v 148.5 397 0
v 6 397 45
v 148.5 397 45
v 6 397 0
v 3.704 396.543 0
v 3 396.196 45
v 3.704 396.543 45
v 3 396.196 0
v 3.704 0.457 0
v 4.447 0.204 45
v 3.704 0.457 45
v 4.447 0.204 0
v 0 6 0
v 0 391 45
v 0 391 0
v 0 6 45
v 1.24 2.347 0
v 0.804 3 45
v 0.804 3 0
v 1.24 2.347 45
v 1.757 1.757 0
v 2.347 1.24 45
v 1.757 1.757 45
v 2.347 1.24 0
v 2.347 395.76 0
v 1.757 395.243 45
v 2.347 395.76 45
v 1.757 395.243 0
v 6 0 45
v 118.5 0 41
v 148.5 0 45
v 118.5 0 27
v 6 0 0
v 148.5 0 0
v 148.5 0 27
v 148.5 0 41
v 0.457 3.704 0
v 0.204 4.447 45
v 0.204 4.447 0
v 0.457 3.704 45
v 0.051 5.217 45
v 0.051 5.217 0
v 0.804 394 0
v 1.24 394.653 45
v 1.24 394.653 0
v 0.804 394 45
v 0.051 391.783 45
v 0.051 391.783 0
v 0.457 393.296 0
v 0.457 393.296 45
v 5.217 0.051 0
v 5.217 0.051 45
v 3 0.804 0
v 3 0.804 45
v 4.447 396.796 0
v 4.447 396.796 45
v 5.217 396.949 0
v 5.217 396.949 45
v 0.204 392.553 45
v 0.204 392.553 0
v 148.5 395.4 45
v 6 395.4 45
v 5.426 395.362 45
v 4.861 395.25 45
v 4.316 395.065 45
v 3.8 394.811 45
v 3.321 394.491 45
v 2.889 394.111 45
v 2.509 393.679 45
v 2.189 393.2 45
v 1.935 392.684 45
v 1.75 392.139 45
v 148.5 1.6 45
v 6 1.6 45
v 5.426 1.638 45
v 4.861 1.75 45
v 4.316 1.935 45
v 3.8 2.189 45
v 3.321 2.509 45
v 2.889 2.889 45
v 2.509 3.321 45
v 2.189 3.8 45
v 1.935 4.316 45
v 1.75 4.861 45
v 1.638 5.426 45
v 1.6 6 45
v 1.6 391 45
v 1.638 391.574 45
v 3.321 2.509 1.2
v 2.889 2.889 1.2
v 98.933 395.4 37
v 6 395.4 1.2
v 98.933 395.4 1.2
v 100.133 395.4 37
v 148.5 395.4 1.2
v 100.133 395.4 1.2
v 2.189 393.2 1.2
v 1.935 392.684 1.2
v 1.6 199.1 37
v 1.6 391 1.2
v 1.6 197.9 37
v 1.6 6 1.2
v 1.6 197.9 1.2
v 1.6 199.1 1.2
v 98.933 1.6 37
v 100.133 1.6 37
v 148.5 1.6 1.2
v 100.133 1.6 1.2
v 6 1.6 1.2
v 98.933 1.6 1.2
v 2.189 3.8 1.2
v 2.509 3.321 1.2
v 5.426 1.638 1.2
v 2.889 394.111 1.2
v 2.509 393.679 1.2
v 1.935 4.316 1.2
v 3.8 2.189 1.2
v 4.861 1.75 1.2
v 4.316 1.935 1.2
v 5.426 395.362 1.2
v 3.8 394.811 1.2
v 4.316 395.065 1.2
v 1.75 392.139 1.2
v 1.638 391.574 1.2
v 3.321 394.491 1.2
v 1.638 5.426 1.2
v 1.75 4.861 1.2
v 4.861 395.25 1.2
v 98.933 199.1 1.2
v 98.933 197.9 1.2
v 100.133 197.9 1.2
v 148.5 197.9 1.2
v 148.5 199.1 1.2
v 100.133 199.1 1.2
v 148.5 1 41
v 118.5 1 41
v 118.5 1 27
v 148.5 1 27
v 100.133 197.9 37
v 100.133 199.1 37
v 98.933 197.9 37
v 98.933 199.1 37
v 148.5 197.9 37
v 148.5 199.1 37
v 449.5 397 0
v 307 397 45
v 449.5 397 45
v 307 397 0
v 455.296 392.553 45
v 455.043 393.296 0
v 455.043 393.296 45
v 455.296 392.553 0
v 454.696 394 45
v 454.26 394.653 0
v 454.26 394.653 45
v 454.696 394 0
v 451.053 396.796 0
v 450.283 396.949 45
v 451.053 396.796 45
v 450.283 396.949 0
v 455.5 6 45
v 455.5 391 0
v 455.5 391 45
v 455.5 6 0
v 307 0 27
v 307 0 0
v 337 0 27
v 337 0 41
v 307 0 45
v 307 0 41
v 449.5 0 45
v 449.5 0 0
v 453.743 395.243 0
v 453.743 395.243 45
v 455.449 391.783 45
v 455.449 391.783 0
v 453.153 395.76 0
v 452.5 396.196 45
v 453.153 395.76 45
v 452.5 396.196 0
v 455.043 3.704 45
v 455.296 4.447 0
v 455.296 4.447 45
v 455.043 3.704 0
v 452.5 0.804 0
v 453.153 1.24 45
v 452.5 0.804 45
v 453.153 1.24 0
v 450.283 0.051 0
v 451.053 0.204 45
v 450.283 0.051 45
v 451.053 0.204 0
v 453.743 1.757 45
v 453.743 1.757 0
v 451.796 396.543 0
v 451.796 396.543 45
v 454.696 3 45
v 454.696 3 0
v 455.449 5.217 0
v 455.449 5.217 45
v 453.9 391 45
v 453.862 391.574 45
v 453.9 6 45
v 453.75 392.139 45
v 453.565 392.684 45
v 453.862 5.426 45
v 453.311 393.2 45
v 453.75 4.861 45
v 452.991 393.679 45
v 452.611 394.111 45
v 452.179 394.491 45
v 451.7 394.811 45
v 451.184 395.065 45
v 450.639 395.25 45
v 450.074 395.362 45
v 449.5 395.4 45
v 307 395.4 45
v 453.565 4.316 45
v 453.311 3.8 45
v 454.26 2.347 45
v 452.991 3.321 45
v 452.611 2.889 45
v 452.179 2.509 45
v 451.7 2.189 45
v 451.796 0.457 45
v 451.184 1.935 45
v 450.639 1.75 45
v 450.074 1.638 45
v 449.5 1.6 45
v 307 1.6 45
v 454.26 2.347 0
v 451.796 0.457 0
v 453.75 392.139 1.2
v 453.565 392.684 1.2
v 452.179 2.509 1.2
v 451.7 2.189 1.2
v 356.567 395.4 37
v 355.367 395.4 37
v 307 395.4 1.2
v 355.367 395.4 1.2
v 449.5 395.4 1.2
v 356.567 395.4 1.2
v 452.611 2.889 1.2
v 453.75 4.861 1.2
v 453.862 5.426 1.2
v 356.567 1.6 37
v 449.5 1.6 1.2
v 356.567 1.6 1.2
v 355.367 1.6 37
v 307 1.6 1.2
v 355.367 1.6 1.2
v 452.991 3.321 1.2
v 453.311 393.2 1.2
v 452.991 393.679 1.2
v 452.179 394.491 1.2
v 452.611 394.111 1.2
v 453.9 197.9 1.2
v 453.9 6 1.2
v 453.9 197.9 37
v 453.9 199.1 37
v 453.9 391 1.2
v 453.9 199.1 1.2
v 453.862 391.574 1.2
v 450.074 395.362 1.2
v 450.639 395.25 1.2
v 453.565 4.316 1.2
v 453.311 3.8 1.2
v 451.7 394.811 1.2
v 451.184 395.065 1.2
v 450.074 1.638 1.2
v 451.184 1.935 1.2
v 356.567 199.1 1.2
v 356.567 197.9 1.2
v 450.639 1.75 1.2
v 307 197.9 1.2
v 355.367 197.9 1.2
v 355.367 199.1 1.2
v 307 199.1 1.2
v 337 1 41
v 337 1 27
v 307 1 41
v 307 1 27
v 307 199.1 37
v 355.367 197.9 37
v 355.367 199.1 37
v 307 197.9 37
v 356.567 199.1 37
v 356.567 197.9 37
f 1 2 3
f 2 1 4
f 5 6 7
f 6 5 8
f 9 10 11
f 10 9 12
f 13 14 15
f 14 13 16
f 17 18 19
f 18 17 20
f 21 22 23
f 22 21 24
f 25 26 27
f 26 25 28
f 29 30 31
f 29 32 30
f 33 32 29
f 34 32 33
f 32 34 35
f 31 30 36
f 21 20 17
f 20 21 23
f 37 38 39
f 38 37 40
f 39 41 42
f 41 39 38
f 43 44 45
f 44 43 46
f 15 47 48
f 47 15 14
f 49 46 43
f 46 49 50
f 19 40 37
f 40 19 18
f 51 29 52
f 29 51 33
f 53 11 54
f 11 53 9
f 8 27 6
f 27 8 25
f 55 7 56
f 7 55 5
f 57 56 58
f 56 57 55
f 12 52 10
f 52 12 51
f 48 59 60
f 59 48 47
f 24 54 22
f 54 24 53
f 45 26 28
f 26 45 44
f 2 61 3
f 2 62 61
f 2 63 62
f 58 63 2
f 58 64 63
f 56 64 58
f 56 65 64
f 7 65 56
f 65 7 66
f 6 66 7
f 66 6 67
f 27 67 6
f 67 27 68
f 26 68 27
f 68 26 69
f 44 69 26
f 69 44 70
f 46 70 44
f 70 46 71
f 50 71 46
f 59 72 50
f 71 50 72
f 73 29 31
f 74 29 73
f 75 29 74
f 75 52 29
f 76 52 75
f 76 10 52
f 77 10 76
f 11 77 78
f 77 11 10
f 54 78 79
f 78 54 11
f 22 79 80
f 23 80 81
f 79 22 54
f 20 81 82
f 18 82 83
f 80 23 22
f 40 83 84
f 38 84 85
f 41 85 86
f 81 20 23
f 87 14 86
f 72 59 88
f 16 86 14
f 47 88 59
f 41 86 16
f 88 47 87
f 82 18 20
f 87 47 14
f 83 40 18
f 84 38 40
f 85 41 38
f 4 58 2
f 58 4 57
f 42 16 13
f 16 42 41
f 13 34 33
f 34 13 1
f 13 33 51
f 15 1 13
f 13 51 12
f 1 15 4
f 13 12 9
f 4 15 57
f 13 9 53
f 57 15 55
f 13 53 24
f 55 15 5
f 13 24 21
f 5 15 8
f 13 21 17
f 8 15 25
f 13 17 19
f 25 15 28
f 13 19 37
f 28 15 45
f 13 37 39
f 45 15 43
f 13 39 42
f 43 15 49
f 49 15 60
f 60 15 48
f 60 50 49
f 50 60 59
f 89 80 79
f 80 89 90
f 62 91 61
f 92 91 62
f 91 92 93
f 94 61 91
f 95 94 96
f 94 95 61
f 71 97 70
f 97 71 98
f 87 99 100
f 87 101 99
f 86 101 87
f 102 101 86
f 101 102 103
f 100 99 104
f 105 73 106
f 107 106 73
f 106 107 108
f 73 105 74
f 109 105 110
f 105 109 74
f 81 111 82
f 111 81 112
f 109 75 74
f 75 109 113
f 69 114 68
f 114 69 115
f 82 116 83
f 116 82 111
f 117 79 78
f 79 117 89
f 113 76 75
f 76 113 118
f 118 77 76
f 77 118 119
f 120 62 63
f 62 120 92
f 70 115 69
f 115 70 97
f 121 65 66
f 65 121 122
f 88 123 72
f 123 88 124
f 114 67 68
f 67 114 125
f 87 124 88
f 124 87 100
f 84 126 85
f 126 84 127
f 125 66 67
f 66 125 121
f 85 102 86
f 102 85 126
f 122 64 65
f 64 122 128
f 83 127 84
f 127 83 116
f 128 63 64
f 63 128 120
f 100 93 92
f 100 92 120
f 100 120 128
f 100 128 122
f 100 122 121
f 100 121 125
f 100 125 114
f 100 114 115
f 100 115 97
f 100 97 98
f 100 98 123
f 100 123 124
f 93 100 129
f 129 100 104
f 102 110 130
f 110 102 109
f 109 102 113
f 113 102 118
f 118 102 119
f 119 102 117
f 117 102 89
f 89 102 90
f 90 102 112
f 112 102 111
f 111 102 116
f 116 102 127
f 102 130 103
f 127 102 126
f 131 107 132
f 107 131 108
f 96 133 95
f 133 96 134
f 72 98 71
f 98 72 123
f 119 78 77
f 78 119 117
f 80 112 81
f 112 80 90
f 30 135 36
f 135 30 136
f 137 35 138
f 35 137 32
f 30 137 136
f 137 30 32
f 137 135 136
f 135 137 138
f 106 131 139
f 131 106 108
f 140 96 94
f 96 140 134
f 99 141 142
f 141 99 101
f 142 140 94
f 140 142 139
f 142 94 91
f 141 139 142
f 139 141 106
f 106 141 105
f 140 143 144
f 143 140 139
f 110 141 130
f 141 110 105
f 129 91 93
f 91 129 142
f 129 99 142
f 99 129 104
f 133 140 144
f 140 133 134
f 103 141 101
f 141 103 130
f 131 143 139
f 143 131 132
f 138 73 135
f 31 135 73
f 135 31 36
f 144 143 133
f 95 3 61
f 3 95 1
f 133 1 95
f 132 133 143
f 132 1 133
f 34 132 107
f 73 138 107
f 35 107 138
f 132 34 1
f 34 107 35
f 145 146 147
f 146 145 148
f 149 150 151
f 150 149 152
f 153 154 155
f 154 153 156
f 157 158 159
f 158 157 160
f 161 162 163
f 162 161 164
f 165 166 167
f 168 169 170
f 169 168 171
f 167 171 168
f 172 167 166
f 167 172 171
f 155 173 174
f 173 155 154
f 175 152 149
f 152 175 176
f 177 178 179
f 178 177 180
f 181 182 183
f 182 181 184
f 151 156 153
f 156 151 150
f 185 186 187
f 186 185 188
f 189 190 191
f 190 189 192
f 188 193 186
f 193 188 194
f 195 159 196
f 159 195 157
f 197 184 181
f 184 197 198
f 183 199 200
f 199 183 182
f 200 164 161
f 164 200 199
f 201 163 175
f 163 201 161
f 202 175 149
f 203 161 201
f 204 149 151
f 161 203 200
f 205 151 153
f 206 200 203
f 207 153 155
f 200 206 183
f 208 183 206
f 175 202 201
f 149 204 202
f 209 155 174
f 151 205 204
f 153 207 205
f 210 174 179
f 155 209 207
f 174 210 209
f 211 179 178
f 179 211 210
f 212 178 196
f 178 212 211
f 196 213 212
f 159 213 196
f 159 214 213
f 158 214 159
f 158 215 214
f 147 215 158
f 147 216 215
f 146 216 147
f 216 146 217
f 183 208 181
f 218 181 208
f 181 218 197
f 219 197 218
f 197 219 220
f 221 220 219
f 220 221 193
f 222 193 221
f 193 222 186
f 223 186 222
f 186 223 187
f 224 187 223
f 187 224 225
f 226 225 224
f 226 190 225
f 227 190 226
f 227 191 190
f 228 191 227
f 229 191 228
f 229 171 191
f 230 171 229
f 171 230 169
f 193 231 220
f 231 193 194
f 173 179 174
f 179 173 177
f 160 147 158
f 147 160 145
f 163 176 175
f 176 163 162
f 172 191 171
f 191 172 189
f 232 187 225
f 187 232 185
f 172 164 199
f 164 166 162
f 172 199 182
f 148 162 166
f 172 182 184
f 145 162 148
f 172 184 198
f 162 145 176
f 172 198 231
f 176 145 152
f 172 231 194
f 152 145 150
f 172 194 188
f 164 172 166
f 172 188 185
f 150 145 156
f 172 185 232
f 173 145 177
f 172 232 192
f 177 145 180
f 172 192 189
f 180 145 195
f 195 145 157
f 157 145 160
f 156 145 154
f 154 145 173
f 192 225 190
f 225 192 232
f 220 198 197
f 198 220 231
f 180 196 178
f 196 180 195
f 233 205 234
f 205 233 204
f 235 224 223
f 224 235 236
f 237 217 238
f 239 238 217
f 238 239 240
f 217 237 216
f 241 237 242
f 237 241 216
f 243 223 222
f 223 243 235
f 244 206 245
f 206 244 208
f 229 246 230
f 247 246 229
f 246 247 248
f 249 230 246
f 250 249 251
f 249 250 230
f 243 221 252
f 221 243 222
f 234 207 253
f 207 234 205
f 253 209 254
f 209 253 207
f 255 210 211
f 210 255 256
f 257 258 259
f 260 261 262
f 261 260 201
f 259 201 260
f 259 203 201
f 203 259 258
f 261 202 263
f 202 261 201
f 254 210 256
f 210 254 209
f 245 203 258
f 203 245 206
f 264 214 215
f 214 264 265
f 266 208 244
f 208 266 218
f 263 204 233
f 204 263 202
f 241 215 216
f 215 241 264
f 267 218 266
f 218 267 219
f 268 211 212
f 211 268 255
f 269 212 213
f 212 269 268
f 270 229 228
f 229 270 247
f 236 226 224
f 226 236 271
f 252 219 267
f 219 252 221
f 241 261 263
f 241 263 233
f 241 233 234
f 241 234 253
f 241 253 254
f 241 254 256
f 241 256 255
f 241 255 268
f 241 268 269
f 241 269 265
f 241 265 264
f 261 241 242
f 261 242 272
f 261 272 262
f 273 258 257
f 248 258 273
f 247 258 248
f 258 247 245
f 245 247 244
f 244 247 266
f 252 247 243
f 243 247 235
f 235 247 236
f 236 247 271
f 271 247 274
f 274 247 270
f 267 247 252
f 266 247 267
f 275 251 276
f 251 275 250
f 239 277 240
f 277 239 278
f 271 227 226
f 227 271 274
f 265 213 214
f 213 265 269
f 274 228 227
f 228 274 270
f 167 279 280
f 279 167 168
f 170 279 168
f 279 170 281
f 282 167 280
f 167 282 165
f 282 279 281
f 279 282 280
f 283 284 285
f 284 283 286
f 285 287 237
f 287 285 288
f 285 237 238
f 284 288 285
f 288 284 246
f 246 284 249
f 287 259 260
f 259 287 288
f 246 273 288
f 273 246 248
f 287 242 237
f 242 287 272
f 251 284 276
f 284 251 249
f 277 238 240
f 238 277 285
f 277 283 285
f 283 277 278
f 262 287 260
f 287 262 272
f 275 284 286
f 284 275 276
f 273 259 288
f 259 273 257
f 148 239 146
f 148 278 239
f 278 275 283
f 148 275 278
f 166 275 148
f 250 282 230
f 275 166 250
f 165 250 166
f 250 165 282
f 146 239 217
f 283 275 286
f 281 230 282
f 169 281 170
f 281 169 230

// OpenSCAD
// assembl / living — drawer fit · tray
// -------------------------------------
// A tray sized to a measured drawer, with a grid of compartments. Every
// dimension a customer or a maker would change is a parameter at the top;
// everything below derives from them. No library dependencies, so the file
// carries no third-party licence. OpenSCAD 2021.01 or newer.
//
// Status: proposed, unprinted. Print one at a small size before trusting
// the clearances. Not for sale.

/* [Drawer, measured inside, in mm] */
drawer_width  = 300;   // left to right, inside the drawer
drawer_depth  = 400;   // front to back, inside the drawer
drawer_height = 60;    // floor to the underside of the drawer above, or the lip

/* [Tray] */
clearance     = 1.5;   // taken off each side so the tray drops in without force
tray_height   = 45;    // overall height; keep below drawer_height minus 5
wall          = 1.6;   // outer wall; 0.4 mm nozzle × 4 perimeters
floor_t       = 1.2;   // floor thickness
corner_r      = 6;     // outer corner radius

/* [Compartments] */
columns       = 3;     // compartments left to right (used when column_widths is empty)
rows          = 2;     // compartments front to back (used when row_depths is empty)
column_widths = [];    // optional explicit widths in mm, left to right, e.g. [60, 90, 140]; scaled to fit the tray
row_depths    = [];    // optional explicit depths in mm, front to back
divider_t     = 1.2;   // divider thickness
divider_drop  = 8;     // dividers sit this much lower than the wall, so things are easy to lift out

/* [Label slot, on the front wall] */
label         = true;
label_width   = 60;
label_height  = 14;
label_depth   = 1.0;   // recess depth for a printed or paper label

/* [Printer limits] */
max_print     = 250;   // largest axis the printer bed accepts; the tray is split when exceeded

$fn = 48;

tray_w = drawer_width  - 2 * clearance;
tray_d = drawer_depth  - 2 * clearance;
tray_h = min(tray_height, drawer_height - 5);

assert(tray_w > 2 * wall + 10, "drawer too narrow for a tray");
assert(tray_h > floor_t + 5, "tray too low");

module rounded_box(w, d, h, r) {
    hull() for (x = [r, w - r], y = [r, d - r]) translate([x, y, 0]) cylinder(r = r, h = h);
}

module tray_body() {
    difference() {
        rounded_box(tray_w, tray_d, tray_h, corner_r);
        // cavity
        translate([wall, wall, floor_t])
            rounded_box(tray_w - 2 * wall, tray_d - 2 * wall, tray_h, max(corner_r - wall, 1));
        // label recess, front wall, centred
        if (label)
            translate([(tray_w - label_width) / 2, -0.01, tray_h - label_height - 4])
                cube([label_width, label_depth + 0.01, label_height]);
    }
}

// OpenSCAD variables are immutable, so running offsets come from list sums, not loop reassignment.
function sum(v, i = 0) = i >= len(v) ? 0 : v[i] + sum(v, i + 1);
// Divider positions as fractions of the inner span: equal splits, or explicit sizes scaled to fit.
function splits(sizes, n) = len(sizes) > 0
    ? [for (i = [1 : len(sizes) - 1]) sum([for (j = [0 : i - 1]) sizes[j]]) / sum(sizes)]
    : [for (c = [1 : n - 1]) c / n];

module dividers() {
    inner_w = tray_w - 2 * wall;
    inner_d = tray_d - 2 * wall;
    h = tray_h - divider_drop;
    for (f = splits(column_widths, columns))
        translate([wall + f * inner_w - divider_t / 2, wall, 0]) cube([divider_t, inner_d, h]);
    for (f = splits(row_depths, rows))
        translate([wall, wall + f * inner_d - divider_t / 2, 0]) cube([inner_w, divider_t, h]);
}

module drawer_tray() {
    union() { tray_body(); dividers(); }
}

// Split along X when the tray is wider than the bed; each half gets a straight edge to butt against the other.
splits = ceil(tray_w / max_print);
if (splits <= 1) {
    drawer_tray();
} else {
    piece_w = tray_w / splits;
    for (i = [0 : splits - 1])
        translate([i * (piece_w + 10), 0, 0])
            intersection() {
                drawer_tray();
                translate([i * piece_w, -1, -1]) cube([piece_w, tray_d + 2, tray_h + 2]);
            }
    echo(str("Tray wider than the bed: printed as ", splits, " pieces of ", piece_w, " mm"));
}

echo(str("drawer tray ", tray_w, " × ", tray_d, " × ", tray_h, " mm, ", len(column_widths) > 0 ? len(column_widths) : columns, " × ", len(row_depths) > 0 ? len(row_depths) : rows, " compartments"));
